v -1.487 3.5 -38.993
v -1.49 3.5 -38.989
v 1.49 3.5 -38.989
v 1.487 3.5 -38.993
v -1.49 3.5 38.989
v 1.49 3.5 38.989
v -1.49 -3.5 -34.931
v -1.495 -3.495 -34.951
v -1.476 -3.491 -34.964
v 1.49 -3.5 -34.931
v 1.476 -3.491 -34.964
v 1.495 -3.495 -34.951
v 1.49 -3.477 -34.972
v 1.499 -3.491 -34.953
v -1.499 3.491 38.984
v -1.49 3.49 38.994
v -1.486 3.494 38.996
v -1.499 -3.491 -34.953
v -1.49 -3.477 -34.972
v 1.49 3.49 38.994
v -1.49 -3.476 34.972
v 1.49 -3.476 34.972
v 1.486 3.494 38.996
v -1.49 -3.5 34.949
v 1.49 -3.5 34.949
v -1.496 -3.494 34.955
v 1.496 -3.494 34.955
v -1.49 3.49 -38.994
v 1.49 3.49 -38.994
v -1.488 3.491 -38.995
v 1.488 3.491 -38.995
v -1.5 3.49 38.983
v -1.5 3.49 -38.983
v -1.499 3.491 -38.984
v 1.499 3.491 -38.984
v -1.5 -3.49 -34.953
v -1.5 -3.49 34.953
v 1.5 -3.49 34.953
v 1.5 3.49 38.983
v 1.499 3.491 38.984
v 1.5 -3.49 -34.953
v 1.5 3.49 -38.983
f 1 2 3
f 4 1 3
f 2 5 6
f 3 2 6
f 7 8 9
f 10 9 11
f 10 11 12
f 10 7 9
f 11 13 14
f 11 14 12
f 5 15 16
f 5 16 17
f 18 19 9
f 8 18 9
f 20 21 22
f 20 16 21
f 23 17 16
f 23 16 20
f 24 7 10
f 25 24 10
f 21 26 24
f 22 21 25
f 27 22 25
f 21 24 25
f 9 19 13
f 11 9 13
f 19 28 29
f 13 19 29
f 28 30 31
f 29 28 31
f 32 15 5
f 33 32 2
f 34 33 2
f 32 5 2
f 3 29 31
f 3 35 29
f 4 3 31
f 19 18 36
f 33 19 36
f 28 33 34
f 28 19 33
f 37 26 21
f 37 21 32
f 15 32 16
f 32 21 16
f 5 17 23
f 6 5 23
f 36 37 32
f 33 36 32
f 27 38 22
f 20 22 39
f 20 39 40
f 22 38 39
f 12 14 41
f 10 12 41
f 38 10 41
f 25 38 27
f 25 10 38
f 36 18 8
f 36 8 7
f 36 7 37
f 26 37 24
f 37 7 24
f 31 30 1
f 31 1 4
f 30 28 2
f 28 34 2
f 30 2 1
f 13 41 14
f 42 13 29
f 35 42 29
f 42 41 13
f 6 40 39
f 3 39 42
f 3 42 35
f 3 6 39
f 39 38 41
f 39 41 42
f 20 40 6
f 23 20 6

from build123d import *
from OCP.BRepFilletAPI import BRepFilletAPI_MakeChamfer

# Parameters (mm, degrees)
SKETCH1_W           = 3
SKETCH1_H           = 7
BOSS_EXTRUDE1_DEPTH = 39
DRAFT1_ANGLE        = -30
DRAFT2_ANGLE        = -30
CHAMFER1_SIZE       = 0.01
CHAMFER2_SIZE       = 0.007320508
CHAMFER2_SIZE_2     = 0.01
CHAMFER2_SIZE_3     = 0.027320508
CHAMFER2_SIZE_4     = 0.007758146
CHAMFER2_SIZE_5     = 0.017186236


with BuildPart() as part:
    # Sketch1 → Boss-Extrude1 (new, symmetric)
    with BuildSketch(Plane.XY):
        Rectangle(SKETCH1_W, SKETCH1_H)
    extrude(amount=BOSS_EXTRUDE1_DEPTH, both=True)

    # Draft1
    draft1_faces = [part.faces().sort_by_distance(p)[0] for p in [
        (0, 0, 39),
    ]]
    draft(draft1_faces, Plane(origin=(1.5, 3.5, 39), x_dir=(1, 0, 0), z_dir=(0, 1, 0)), DRAFT1_ANGLE)

    # Draft2
    draft2_faces = [part.faces().sort_by_distance(p)[0] for p in [
        (0, 0, -39),
    ]]
    draft(draft2_faces, Plane(origin=(1.5, 3.5, 39), x_dir=(1, 0, 0), z_dir=(0, 1, 0)), DRAFT2_ANGLE)

    # Chamfer1
    chamfer1_edges = [part.edges().sort_by_distance(p)[0] for p in [
        (-1.5, 3.5, 0),
        (1.5, 3.5, 0),
        (1.5, -3.5, 0),
        (-1.5, -3.5, 0),
    ]]
    chamfer(chamfer1_edges, length=CHAMFER1_SIZE)

    # Chamfer2
    chamfer2_edges_1 = [part.edges().sort_by_distance(p)[0] for p in [
        (0, 3.5, -39),
    ]]
    chamfer2_side_1 = [part.faces().sort_by_distance(p)[0] for p in [
        (0, 3.5, -38.99985359),
    ]]
    chamfer2_edges_2 = [part.edges().sort_by_distance(p)[0] for p in [
        (0, -3.5, -34.958548116),
    ]]
    chamfer2_side_2 = [part.faces().sort_by_distance(p)[0] for p in [
        (0, -3.499826795, -34.958648116),
    ]]
    chamfer2_edges_3 = [part.edges().sort_by_distance(p)[0] for p in [
        (1.495, 3.495, -38.997113249),
    ]]
    chamfer2_side_3 = [part.faces().sort_by_distance(p)[0] for p in [
        (1.494882708, 3.494912031, -38.99706246),
    ]]
    chamfer2_edges_4 = [part.edges().sort_by_distance(p)[0] for p in [
        (1.495, 3.495, 38.997113249),
    ]]
    chamfer2_side_4 = [part.faces().sort_by_distance(p)[0] for p in [
        (1.494958531, 3.495041469, 38.996969596),
    ]]
    chamfer2_edges_5 = [part.edges().sort_by_distance(p)[0] for p in [
        (-1.495, 3.495, -38.997113249),
    ]]
    chamfer2_side_5 = [part.faces().sort_by_distance(p)[0] for p in [
        (-1.494882708, 3.494912031, -38.99706246),
    ]]
    chamfer2_edges_6 = [part.edges().sort_by_distance(p)[0] for p in [
        (-1.495, 3.495, 38.997113249),
    ]]
    chamfer2_side_6 = [part.faces().sort_by_distance(p)[0] for p in [
        (-1.494958531, 3.495041469, 38.996969596),
    ]]
    chamfer2_edges_7 = [part.edges().sort_by_distance(p)[0] for p in [
        (0, 3.5, 39),
    ]]
    chamfer2_side_7 = [part.faces().sort_by_distance(p)[0] for p in [
        (0, 3.5, 38.99985359),
    ]]
    chamfer2_edges_8 = [part.edges().sort_by_distance(p)[0] for p in [
        (0, -3.5, 34.958548116),
    ]]
    chamfer2_side_8 = [part.faces().sort_by_distance(p)[0] for p in [
        (0, -3.499826795, 34.958648116),
    ]]
    chamfer2 = BRepFilletAPI_MakeChamfer(part.part.solid().wrapped)
    for e in chamfer2_edges_1:
        chamfer2.Add(CHAMFER2_SIZE, CHAMFER2_SIZE_2, e.wrapped, chamfer2_side_1[0].wrapped)
    for e in chamfer2_edges_2:
        chamfer2.Add(CHAMFER2_SIZE_2, CHAMFER2_SIZE_3, e.wrapped, chamfer2_side_2[0].wrapped)
    for e in chamfer2_edges_3:
        chamfer2.Add(CHAMFER2_SIZE_4, CHAMFER2_SIZE_2, e.wrapped, chamfer2_side_3[0].wrapped)
    for e in chamfer2_edges_4:
        chamfer2.Add(CHAMFER2_SIZE_2, CHAMFER2_SIZE_4, e.wrapped, chamfer2_side_4[0].wrapped)
    for e in chamfer2_edges_5:
        chamfer2.Add(CHAMFER2_SIZE_4, CHAMFER2_SIZE_2, e.wrapped, chamfer2_side_5[0].wrapped)
    for e in chamfer2_edges_6:
        chamfer2.Add(CHAMFER2_SIZE_2, CHAMFER2_SIZE_4, e.wrapped, chamfer2_side_6[0].wrapped)
    for e in chamfer2_edges_7:
        chamfer2.Add(CHAMFER2_SIZE_2, CHAMFER2_SIZE, e.wrapped, chamfer2_side_7[0].wrapped)
    for e in chamfer2_edges_8:
        chamfer2.Add(CHAMFER2_SIZE_3, CHAMFER2_SIZE_2, e.wrapped, chamfer2_side_8[0].wrapped)
    add(Compound.cast(chamfer2.Shape()), mode=Mode.REPLACE)
    chamfer2_2_edges_1 = [part.edges().sort_by_distance(p)[0] for p in [
        (1.499330127, -3.490669873, -34.963934867),
    ]]
    chamfer2_2_side_1 = [part.faces().sort_by_distance(p)[0] for p in [
        (1.499178941, -3.490556484, -34.964000332),
    ]]
    chamfer2_2_edges_2 = [part.edges().sort_by_distance(p)[0] for p in [
        (-1.499330127, -3.490669873, -34.963934867),
    ]]
    chamfer2_2_side_2 = [part.faces().sort_by_distance(p)[0] for p in [
        (-1.499178941, -3.490556484, -34.964000332),
    ]]
    chamfer2_2 = BRepFilletAPI_MakeChamfer(part.part.solid().wrapped)
    for e in chamfer2_2_edges_1:
        chamfer2_2.Add(CHAMFER2_SIZE_5, CHAMFER2_SIZE_2, e.wrapped, chamfer2_2_side_1[0].wrapped)
    for e in chamfer2_2_edges_2:
        chamfer2_2.Add(CHAMFER2_SIZE_5, CHAMFER2_SIZE_2, e.wrapped, chamfer2_2_side_2[0].wrapped)
    add(Compound.cast(chamfer2_2.Shape()), mode=Mode.REPLACE)
    chamfer2_3_edges = [part.edges().sort_by_distance(p)[0] for p in [
        (-1.5, 0.006236096, -36.982874469),
        (-1.5, 0.001698596, 36.980254743),
        (1.5, 0.006236096, -36.982874469),
        (1.5, 0.001698596, 36.980254743),
    ]]
    chamfer(chamfer2_3_edges, length=CHAMFER2_SIZE_2)


solid = part.part
